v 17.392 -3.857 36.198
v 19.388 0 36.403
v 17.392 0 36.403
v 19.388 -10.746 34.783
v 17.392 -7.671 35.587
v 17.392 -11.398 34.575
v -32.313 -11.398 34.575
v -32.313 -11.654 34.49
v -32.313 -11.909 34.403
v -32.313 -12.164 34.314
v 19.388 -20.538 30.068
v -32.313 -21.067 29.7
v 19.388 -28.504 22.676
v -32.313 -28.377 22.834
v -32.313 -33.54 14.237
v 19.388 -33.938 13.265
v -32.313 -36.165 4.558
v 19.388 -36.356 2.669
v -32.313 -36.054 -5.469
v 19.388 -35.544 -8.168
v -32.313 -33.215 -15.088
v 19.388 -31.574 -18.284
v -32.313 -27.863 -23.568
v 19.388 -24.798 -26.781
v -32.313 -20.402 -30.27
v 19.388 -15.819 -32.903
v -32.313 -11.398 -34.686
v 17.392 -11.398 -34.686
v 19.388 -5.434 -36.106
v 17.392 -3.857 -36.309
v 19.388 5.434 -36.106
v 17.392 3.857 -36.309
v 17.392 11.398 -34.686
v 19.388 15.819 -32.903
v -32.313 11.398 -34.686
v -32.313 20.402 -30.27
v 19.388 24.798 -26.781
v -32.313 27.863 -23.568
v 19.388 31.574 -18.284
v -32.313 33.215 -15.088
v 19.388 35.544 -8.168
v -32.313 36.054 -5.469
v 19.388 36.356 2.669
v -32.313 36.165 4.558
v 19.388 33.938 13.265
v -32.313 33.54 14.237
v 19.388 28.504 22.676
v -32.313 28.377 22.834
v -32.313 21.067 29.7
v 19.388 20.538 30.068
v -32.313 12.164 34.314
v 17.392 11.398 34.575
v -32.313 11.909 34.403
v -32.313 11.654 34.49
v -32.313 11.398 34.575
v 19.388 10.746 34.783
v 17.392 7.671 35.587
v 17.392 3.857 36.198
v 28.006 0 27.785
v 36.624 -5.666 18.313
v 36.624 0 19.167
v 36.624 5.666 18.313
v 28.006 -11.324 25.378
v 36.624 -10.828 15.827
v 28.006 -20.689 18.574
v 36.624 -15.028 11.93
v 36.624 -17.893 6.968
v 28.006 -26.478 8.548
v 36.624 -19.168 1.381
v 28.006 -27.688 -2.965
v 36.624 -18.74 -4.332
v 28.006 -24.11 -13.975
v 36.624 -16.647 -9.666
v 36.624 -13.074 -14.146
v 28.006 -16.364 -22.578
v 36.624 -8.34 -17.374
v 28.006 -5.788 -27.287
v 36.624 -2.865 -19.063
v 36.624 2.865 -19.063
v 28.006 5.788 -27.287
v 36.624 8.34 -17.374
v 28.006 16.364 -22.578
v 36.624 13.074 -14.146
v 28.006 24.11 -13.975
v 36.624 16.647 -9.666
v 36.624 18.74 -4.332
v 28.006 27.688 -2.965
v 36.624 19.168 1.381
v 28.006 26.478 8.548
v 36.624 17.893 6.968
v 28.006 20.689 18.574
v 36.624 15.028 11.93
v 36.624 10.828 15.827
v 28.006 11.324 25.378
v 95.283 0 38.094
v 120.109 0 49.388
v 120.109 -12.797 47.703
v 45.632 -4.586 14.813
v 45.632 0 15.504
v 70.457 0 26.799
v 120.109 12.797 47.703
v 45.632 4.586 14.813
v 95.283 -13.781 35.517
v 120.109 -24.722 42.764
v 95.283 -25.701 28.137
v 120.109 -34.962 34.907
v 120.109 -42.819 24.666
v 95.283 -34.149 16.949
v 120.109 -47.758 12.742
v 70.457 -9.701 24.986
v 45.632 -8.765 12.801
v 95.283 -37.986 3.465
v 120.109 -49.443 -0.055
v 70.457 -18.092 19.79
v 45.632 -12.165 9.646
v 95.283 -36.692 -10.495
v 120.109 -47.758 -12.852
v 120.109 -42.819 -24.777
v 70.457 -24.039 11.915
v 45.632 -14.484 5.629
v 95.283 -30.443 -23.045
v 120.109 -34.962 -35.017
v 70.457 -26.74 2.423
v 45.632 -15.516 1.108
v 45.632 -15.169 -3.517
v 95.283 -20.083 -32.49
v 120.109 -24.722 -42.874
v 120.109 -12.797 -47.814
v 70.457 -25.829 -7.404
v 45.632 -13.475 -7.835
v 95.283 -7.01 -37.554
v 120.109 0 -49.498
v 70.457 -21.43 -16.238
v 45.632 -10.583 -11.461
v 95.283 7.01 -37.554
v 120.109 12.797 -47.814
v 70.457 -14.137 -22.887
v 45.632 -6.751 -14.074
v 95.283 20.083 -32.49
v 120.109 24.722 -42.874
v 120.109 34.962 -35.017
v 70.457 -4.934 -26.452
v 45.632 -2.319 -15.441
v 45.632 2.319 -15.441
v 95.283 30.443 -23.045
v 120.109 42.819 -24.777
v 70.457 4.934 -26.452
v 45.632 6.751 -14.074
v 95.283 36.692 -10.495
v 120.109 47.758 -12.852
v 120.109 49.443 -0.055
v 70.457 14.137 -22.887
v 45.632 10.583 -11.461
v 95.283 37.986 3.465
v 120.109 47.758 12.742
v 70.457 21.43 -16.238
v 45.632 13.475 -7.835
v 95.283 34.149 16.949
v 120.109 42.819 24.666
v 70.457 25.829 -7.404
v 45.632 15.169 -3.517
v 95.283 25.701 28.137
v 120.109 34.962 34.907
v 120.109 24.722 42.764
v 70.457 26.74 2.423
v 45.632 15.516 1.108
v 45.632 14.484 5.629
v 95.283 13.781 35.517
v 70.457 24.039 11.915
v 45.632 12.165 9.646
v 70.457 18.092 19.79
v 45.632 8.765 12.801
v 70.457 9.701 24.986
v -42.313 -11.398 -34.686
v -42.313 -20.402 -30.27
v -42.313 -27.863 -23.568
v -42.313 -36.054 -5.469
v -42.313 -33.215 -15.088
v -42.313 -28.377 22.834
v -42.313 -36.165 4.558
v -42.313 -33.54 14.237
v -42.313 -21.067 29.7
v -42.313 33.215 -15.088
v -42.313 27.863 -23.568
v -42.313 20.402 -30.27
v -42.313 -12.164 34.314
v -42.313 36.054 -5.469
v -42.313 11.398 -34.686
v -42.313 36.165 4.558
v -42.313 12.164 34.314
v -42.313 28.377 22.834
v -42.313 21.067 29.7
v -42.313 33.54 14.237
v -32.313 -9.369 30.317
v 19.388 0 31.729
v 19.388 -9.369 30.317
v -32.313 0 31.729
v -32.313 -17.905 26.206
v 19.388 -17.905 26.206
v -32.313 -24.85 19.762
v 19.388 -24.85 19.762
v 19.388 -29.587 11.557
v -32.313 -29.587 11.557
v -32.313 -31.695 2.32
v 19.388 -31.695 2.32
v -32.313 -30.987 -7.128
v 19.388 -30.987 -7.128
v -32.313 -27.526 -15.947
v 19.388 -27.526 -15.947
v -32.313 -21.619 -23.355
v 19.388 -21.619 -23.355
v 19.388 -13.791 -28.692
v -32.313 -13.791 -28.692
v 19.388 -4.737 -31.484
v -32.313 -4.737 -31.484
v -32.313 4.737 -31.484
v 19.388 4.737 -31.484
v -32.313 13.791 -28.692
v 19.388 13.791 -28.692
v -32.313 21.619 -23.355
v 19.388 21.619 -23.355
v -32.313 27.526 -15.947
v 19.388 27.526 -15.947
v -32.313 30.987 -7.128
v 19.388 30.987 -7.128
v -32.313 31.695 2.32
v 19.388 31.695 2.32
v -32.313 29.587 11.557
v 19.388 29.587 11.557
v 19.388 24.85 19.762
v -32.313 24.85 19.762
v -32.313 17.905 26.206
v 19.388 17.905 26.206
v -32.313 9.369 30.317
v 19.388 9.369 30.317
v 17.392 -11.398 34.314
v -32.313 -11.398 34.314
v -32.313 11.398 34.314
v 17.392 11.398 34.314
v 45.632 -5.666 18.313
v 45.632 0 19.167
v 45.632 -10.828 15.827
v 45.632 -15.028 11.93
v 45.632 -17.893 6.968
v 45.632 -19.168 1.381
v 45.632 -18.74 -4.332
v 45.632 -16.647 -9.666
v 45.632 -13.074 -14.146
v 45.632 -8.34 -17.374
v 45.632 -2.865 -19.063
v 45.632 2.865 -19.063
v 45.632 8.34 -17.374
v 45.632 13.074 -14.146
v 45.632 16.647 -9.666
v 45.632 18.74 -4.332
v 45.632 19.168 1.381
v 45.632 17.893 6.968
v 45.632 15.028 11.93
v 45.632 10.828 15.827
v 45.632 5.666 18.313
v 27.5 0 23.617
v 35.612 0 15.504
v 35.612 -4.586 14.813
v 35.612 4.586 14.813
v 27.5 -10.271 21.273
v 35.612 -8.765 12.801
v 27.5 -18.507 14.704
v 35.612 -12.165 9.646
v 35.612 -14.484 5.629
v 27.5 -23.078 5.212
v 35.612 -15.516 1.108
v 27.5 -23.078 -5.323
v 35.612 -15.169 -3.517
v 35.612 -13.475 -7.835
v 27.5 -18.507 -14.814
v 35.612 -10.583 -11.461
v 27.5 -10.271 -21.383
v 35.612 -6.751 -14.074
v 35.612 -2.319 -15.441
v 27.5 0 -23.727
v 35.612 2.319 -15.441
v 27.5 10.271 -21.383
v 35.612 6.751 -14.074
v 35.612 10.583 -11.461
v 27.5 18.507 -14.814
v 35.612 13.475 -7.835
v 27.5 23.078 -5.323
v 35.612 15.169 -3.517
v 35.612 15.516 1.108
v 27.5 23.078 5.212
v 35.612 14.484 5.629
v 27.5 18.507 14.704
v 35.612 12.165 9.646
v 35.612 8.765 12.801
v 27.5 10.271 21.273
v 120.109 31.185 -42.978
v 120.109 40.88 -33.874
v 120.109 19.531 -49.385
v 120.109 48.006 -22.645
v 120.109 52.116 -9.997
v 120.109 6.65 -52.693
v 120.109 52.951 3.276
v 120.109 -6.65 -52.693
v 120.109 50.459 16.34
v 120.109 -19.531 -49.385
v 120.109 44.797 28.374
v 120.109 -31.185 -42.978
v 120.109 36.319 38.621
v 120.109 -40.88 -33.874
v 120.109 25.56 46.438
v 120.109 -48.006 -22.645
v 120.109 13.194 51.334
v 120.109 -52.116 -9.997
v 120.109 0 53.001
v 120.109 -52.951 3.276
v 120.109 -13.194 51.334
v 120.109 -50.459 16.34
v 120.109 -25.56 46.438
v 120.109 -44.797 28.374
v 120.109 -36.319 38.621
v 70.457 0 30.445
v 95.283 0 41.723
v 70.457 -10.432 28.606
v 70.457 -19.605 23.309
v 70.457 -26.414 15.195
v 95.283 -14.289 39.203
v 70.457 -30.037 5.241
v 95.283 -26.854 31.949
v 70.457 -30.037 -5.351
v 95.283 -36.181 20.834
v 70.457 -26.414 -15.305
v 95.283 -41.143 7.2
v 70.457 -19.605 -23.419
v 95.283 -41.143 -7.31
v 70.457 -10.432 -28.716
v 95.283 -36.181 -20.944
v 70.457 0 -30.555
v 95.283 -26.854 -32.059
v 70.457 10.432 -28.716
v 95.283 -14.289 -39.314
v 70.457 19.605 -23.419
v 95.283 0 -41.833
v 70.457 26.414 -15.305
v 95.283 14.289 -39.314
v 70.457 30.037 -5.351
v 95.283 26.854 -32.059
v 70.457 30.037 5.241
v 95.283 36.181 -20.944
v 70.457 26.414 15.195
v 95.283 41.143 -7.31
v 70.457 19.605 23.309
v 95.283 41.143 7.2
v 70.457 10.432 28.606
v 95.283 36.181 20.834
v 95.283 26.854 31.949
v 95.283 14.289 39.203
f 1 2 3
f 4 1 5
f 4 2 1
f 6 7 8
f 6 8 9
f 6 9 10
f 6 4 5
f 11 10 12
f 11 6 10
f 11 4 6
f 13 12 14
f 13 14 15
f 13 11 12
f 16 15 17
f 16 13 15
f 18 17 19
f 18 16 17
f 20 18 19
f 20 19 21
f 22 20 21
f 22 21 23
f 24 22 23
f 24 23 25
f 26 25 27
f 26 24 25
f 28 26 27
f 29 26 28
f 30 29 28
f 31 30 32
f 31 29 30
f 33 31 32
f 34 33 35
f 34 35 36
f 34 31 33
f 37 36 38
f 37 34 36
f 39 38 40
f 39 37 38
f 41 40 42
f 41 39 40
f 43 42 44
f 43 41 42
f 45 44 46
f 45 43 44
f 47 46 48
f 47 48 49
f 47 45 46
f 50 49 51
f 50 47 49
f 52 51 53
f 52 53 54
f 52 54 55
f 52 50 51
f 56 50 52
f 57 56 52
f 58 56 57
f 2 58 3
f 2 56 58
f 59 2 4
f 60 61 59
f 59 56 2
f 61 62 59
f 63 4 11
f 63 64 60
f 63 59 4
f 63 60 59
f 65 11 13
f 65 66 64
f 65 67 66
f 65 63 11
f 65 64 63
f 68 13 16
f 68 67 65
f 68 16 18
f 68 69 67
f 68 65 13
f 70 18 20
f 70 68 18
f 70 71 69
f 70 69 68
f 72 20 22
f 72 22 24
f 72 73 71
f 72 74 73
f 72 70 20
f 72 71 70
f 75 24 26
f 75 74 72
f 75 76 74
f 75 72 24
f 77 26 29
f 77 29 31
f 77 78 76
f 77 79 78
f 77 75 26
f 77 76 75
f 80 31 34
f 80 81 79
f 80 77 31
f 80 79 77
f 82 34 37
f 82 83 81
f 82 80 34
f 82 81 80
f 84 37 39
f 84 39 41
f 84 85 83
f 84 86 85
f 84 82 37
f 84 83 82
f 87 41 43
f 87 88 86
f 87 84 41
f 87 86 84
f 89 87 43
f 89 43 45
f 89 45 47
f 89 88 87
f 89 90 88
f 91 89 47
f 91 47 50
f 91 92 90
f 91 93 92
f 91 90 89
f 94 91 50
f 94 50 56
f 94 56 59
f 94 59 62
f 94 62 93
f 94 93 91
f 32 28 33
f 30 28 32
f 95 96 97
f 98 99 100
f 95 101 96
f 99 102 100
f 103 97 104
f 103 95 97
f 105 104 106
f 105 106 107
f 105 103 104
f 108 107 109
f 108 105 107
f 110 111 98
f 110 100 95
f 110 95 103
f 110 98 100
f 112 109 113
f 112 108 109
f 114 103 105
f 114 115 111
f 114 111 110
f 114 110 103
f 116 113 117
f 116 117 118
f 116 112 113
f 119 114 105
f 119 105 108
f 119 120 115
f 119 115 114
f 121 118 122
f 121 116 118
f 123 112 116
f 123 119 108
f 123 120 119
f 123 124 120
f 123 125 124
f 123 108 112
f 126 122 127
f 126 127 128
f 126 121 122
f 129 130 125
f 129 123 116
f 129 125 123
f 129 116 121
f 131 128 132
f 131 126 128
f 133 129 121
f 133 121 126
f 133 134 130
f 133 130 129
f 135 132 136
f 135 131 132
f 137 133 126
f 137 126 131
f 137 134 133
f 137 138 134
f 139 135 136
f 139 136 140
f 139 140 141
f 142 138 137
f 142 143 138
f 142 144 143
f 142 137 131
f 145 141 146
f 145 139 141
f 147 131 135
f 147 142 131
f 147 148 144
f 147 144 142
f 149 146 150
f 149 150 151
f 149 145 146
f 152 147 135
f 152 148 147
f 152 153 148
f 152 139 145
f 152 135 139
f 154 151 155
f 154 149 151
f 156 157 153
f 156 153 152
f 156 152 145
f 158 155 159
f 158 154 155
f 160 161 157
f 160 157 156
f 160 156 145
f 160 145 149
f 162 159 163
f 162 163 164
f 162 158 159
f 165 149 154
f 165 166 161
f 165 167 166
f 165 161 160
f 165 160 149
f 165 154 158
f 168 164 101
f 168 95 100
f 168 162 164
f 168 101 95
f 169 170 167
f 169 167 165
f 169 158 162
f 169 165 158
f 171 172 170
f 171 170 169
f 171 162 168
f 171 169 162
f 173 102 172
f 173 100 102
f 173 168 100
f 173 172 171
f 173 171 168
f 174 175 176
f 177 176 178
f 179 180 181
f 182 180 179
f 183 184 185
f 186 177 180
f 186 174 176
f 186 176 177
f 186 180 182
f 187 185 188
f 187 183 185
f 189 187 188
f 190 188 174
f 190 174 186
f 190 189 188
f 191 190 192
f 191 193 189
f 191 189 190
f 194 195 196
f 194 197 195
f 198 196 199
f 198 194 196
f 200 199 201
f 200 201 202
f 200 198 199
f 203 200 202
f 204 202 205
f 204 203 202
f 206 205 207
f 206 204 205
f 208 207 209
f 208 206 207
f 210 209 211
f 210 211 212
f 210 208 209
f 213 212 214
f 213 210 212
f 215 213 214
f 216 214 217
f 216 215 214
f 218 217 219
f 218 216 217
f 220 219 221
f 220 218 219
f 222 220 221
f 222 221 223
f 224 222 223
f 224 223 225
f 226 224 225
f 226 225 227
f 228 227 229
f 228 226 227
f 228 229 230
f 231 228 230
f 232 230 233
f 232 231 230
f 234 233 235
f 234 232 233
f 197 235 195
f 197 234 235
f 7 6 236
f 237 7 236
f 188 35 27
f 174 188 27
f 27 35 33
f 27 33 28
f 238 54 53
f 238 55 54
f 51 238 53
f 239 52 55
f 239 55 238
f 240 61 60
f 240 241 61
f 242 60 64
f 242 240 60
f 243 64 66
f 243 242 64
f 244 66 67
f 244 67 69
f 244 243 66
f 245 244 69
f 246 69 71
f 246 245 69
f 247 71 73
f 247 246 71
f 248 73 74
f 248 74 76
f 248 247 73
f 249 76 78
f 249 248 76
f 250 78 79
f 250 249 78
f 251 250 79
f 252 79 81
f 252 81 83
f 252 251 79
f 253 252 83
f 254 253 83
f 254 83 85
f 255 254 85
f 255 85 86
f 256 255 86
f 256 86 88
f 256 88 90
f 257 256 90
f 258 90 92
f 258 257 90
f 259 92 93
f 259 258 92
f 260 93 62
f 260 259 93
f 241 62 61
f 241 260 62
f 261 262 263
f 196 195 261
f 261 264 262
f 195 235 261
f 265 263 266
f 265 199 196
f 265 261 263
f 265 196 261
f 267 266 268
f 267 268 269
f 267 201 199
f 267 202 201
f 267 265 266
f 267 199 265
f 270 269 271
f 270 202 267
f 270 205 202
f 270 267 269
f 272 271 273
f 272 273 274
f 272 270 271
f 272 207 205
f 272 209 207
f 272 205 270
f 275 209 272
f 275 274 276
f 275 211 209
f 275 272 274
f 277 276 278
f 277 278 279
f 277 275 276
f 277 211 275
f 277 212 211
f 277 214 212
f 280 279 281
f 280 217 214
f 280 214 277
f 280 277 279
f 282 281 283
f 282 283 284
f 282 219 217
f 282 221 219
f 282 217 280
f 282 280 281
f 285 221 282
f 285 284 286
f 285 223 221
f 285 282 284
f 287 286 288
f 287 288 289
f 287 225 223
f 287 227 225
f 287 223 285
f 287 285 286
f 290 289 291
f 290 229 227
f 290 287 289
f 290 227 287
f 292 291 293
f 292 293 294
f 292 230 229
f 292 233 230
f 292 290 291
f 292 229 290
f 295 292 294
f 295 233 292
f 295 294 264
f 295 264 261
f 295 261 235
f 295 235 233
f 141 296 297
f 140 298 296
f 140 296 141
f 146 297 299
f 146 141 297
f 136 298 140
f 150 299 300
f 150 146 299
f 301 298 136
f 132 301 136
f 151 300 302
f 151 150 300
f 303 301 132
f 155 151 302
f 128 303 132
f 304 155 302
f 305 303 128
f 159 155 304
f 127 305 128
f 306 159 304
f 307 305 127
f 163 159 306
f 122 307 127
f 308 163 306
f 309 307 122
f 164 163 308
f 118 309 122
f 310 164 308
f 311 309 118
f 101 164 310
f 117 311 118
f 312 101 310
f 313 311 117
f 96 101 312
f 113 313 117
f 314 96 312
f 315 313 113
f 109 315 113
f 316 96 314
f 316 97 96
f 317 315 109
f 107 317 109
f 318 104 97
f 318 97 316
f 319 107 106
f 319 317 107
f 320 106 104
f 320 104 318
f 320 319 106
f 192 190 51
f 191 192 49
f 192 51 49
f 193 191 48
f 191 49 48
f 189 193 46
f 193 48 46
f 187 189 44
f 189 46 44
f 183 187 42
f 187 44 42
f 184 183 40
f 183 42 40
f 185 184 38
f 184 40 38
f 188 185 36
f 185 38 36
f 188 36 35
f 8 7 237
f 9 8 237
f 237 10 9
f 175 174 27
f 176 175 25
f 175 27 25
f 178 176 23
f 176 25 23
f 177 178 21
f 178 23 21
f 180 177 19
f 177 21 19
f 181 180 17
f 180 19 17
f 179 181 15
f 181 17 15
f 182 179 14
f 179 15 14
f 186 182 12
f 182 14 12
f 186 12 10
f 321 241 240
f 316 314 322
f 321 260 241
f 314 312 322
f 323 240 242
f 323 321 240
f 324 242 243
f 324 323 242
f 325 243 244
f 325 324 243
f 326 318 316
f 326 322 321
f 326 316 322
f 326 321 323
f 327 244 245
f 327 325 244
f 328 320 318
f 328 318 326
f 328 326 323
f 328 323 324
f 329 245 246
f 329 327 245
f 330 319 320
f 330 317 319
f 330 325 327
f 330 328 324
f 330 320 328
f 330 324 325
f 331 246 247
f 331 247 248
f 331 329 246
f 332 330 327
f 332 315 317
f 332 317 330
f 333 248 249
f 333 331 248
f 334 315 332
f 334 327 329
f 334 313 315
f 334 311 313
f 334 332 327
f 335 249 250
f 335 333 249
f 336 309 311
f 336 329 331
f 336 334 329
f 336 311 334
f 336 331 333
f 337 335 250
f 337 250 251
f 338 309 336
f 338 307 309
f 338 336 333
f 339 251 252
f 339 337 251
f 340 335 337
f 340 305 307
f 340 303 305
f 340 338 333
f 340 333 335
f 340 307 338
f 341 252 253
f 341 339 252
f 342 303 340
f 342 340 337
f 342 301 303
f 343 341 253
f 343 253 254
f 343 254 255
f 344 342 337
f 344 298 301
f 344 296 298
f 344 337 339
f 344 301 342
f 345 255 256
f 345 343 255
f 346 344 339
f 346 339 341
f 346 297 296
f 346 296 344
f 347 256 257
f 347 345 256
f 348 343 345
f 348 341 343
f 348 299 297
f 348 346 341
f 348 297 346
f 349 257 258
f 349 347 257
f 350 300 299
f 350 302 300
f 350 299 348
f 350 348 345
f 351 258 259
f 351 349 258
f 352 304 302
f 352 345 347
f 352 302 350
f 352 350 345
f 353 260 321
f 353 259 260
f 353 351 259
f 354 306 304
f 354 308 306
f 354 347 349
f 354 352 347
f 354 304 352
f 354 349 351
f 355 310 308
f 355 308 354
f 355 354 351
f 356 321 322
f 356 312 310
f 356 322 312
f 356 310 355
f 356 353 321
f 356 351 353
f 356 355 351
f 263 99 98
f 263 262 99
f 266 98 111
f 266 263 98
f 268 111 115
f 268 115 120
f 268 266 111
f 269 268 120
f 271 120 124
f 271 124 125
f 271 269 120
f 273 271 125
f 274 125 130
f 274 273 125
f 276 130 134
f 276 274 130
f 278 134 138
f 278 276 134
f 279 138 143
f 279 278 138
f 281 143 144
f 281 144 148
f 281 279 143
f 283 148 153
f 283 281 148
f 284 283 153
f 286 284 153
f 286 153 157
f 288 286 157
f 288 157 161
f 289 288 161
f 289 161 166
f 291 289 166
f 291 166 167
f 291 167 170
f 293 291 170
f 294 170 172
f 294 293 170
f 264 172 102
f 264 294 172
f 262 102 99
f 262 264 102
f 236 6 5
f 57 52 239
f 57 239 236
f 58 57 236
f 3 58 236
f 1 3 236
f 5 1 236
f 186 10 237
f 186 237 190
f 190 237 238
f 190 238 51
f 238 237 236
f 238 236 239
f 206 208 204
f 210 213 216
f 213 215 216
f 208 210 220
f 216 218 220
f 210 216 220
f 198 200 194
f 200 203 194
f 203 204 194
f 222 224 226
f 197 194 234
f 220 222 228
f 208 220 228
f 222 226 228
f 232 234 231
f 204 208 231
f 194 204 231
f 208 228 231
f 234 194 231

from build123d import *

# Parameters (mm, degrees)
SCALE1_SCALE        = 3
SKETCH5_W           = 6.092075514
SKETCH5_H           = 37.994626104
SKETCH5_W_2         = 6.963088047
CUT_EXTRUDE1_DEPTH  = 213.004502745
SCALE2_SCALE        = 0.6
BOSS_EXTRUDE1_DEPTH = 10


with BuildPart() as part:
    # Sketch1 → Revolve1 (revolve)
    with BuildSketch(Plane.XY, mode=Mode.PRIVATE) as revolve1_sk:
        Polygon((84.678634707, 29.475453574), (84.678634707, 27.468448008), (43.302663782, 8.644223267), (37.73625143, 8.644223267), (28.722559742, 17.657914956), (0, 17.657914956), (0, 20.25452291), (28.722559742, 20.25452291), (38.298141584, 10.678941067), (43.302663782, 10.678941067), align=None)
    revolve(revolve1_sk.sketch.rotate(Axis((0, 0, 0), (1, 0, 0)), 90), axis=Axis((0, 0, 0), (1, 0, 0)))


with BuildPart() as part_1:
    # Scale1: scaled about (41.420833763, 0, 0)
    add(part.part.scale(SCALE1_SCALE).moved(Location((-82.841667526, 0, 0))))

    # Sketch5 → Cut-Extrude1 (cut, through all)
    with BuildSketch(Plane(origin=(0, 0, 0), x_dir=(0, 0, -1), z_dir=(1, 0, 0))):
        with Locations((60.76356873, 0)):
            Rectangle(SKETCH5_W, SKETCH5_H)
        with Locations((-60.763568731, 0)):
            Rectangle(SKETCH5_W_2, SKETCH5_H)
    extrude(amount=-CUT_EXTRUDE1_DEPTH, mode=Mode.SUBTRACT)


with BuildPart() as part_2:
    # Scale2: scaled about (43.48021303, 0, -0.13779422)
    add(part_1.part.scale(SCALE2_SCALE).moved(Location((17.392085212, 0, -0.055117688))))

    # Sketch6 → Boss-Extrude1 (add)
    with BuildSketch(Plane.ZY.offset(32.312915304)):
        with BuildLine():
            Line((-34.685636272, 11.398387831), (-34.685636272, -11.398387831))
            ThreePointArc((-34.685636272, -11.398387831), (-0.459415669, -36.455899464), (34.314097136, -12.163598765))
            Line((34.314097136, -12.163598765), (34.314097136, -11.398387831))
            Line((34.314097136, -11.398387831), (34.314097136, 11.398387831))
            Line((34.314097136, 11.398387831), (34.314097136, 12.163598765))
            ThreePointArc((34.314097136, 12.163598765), (-0.459415669, 36.455899464), (-34.685636272, 11.398387831))
        make_face()
    extrude(amount=BOSS_EXTRUDE1_DEPTH)


solid = part_2.part
